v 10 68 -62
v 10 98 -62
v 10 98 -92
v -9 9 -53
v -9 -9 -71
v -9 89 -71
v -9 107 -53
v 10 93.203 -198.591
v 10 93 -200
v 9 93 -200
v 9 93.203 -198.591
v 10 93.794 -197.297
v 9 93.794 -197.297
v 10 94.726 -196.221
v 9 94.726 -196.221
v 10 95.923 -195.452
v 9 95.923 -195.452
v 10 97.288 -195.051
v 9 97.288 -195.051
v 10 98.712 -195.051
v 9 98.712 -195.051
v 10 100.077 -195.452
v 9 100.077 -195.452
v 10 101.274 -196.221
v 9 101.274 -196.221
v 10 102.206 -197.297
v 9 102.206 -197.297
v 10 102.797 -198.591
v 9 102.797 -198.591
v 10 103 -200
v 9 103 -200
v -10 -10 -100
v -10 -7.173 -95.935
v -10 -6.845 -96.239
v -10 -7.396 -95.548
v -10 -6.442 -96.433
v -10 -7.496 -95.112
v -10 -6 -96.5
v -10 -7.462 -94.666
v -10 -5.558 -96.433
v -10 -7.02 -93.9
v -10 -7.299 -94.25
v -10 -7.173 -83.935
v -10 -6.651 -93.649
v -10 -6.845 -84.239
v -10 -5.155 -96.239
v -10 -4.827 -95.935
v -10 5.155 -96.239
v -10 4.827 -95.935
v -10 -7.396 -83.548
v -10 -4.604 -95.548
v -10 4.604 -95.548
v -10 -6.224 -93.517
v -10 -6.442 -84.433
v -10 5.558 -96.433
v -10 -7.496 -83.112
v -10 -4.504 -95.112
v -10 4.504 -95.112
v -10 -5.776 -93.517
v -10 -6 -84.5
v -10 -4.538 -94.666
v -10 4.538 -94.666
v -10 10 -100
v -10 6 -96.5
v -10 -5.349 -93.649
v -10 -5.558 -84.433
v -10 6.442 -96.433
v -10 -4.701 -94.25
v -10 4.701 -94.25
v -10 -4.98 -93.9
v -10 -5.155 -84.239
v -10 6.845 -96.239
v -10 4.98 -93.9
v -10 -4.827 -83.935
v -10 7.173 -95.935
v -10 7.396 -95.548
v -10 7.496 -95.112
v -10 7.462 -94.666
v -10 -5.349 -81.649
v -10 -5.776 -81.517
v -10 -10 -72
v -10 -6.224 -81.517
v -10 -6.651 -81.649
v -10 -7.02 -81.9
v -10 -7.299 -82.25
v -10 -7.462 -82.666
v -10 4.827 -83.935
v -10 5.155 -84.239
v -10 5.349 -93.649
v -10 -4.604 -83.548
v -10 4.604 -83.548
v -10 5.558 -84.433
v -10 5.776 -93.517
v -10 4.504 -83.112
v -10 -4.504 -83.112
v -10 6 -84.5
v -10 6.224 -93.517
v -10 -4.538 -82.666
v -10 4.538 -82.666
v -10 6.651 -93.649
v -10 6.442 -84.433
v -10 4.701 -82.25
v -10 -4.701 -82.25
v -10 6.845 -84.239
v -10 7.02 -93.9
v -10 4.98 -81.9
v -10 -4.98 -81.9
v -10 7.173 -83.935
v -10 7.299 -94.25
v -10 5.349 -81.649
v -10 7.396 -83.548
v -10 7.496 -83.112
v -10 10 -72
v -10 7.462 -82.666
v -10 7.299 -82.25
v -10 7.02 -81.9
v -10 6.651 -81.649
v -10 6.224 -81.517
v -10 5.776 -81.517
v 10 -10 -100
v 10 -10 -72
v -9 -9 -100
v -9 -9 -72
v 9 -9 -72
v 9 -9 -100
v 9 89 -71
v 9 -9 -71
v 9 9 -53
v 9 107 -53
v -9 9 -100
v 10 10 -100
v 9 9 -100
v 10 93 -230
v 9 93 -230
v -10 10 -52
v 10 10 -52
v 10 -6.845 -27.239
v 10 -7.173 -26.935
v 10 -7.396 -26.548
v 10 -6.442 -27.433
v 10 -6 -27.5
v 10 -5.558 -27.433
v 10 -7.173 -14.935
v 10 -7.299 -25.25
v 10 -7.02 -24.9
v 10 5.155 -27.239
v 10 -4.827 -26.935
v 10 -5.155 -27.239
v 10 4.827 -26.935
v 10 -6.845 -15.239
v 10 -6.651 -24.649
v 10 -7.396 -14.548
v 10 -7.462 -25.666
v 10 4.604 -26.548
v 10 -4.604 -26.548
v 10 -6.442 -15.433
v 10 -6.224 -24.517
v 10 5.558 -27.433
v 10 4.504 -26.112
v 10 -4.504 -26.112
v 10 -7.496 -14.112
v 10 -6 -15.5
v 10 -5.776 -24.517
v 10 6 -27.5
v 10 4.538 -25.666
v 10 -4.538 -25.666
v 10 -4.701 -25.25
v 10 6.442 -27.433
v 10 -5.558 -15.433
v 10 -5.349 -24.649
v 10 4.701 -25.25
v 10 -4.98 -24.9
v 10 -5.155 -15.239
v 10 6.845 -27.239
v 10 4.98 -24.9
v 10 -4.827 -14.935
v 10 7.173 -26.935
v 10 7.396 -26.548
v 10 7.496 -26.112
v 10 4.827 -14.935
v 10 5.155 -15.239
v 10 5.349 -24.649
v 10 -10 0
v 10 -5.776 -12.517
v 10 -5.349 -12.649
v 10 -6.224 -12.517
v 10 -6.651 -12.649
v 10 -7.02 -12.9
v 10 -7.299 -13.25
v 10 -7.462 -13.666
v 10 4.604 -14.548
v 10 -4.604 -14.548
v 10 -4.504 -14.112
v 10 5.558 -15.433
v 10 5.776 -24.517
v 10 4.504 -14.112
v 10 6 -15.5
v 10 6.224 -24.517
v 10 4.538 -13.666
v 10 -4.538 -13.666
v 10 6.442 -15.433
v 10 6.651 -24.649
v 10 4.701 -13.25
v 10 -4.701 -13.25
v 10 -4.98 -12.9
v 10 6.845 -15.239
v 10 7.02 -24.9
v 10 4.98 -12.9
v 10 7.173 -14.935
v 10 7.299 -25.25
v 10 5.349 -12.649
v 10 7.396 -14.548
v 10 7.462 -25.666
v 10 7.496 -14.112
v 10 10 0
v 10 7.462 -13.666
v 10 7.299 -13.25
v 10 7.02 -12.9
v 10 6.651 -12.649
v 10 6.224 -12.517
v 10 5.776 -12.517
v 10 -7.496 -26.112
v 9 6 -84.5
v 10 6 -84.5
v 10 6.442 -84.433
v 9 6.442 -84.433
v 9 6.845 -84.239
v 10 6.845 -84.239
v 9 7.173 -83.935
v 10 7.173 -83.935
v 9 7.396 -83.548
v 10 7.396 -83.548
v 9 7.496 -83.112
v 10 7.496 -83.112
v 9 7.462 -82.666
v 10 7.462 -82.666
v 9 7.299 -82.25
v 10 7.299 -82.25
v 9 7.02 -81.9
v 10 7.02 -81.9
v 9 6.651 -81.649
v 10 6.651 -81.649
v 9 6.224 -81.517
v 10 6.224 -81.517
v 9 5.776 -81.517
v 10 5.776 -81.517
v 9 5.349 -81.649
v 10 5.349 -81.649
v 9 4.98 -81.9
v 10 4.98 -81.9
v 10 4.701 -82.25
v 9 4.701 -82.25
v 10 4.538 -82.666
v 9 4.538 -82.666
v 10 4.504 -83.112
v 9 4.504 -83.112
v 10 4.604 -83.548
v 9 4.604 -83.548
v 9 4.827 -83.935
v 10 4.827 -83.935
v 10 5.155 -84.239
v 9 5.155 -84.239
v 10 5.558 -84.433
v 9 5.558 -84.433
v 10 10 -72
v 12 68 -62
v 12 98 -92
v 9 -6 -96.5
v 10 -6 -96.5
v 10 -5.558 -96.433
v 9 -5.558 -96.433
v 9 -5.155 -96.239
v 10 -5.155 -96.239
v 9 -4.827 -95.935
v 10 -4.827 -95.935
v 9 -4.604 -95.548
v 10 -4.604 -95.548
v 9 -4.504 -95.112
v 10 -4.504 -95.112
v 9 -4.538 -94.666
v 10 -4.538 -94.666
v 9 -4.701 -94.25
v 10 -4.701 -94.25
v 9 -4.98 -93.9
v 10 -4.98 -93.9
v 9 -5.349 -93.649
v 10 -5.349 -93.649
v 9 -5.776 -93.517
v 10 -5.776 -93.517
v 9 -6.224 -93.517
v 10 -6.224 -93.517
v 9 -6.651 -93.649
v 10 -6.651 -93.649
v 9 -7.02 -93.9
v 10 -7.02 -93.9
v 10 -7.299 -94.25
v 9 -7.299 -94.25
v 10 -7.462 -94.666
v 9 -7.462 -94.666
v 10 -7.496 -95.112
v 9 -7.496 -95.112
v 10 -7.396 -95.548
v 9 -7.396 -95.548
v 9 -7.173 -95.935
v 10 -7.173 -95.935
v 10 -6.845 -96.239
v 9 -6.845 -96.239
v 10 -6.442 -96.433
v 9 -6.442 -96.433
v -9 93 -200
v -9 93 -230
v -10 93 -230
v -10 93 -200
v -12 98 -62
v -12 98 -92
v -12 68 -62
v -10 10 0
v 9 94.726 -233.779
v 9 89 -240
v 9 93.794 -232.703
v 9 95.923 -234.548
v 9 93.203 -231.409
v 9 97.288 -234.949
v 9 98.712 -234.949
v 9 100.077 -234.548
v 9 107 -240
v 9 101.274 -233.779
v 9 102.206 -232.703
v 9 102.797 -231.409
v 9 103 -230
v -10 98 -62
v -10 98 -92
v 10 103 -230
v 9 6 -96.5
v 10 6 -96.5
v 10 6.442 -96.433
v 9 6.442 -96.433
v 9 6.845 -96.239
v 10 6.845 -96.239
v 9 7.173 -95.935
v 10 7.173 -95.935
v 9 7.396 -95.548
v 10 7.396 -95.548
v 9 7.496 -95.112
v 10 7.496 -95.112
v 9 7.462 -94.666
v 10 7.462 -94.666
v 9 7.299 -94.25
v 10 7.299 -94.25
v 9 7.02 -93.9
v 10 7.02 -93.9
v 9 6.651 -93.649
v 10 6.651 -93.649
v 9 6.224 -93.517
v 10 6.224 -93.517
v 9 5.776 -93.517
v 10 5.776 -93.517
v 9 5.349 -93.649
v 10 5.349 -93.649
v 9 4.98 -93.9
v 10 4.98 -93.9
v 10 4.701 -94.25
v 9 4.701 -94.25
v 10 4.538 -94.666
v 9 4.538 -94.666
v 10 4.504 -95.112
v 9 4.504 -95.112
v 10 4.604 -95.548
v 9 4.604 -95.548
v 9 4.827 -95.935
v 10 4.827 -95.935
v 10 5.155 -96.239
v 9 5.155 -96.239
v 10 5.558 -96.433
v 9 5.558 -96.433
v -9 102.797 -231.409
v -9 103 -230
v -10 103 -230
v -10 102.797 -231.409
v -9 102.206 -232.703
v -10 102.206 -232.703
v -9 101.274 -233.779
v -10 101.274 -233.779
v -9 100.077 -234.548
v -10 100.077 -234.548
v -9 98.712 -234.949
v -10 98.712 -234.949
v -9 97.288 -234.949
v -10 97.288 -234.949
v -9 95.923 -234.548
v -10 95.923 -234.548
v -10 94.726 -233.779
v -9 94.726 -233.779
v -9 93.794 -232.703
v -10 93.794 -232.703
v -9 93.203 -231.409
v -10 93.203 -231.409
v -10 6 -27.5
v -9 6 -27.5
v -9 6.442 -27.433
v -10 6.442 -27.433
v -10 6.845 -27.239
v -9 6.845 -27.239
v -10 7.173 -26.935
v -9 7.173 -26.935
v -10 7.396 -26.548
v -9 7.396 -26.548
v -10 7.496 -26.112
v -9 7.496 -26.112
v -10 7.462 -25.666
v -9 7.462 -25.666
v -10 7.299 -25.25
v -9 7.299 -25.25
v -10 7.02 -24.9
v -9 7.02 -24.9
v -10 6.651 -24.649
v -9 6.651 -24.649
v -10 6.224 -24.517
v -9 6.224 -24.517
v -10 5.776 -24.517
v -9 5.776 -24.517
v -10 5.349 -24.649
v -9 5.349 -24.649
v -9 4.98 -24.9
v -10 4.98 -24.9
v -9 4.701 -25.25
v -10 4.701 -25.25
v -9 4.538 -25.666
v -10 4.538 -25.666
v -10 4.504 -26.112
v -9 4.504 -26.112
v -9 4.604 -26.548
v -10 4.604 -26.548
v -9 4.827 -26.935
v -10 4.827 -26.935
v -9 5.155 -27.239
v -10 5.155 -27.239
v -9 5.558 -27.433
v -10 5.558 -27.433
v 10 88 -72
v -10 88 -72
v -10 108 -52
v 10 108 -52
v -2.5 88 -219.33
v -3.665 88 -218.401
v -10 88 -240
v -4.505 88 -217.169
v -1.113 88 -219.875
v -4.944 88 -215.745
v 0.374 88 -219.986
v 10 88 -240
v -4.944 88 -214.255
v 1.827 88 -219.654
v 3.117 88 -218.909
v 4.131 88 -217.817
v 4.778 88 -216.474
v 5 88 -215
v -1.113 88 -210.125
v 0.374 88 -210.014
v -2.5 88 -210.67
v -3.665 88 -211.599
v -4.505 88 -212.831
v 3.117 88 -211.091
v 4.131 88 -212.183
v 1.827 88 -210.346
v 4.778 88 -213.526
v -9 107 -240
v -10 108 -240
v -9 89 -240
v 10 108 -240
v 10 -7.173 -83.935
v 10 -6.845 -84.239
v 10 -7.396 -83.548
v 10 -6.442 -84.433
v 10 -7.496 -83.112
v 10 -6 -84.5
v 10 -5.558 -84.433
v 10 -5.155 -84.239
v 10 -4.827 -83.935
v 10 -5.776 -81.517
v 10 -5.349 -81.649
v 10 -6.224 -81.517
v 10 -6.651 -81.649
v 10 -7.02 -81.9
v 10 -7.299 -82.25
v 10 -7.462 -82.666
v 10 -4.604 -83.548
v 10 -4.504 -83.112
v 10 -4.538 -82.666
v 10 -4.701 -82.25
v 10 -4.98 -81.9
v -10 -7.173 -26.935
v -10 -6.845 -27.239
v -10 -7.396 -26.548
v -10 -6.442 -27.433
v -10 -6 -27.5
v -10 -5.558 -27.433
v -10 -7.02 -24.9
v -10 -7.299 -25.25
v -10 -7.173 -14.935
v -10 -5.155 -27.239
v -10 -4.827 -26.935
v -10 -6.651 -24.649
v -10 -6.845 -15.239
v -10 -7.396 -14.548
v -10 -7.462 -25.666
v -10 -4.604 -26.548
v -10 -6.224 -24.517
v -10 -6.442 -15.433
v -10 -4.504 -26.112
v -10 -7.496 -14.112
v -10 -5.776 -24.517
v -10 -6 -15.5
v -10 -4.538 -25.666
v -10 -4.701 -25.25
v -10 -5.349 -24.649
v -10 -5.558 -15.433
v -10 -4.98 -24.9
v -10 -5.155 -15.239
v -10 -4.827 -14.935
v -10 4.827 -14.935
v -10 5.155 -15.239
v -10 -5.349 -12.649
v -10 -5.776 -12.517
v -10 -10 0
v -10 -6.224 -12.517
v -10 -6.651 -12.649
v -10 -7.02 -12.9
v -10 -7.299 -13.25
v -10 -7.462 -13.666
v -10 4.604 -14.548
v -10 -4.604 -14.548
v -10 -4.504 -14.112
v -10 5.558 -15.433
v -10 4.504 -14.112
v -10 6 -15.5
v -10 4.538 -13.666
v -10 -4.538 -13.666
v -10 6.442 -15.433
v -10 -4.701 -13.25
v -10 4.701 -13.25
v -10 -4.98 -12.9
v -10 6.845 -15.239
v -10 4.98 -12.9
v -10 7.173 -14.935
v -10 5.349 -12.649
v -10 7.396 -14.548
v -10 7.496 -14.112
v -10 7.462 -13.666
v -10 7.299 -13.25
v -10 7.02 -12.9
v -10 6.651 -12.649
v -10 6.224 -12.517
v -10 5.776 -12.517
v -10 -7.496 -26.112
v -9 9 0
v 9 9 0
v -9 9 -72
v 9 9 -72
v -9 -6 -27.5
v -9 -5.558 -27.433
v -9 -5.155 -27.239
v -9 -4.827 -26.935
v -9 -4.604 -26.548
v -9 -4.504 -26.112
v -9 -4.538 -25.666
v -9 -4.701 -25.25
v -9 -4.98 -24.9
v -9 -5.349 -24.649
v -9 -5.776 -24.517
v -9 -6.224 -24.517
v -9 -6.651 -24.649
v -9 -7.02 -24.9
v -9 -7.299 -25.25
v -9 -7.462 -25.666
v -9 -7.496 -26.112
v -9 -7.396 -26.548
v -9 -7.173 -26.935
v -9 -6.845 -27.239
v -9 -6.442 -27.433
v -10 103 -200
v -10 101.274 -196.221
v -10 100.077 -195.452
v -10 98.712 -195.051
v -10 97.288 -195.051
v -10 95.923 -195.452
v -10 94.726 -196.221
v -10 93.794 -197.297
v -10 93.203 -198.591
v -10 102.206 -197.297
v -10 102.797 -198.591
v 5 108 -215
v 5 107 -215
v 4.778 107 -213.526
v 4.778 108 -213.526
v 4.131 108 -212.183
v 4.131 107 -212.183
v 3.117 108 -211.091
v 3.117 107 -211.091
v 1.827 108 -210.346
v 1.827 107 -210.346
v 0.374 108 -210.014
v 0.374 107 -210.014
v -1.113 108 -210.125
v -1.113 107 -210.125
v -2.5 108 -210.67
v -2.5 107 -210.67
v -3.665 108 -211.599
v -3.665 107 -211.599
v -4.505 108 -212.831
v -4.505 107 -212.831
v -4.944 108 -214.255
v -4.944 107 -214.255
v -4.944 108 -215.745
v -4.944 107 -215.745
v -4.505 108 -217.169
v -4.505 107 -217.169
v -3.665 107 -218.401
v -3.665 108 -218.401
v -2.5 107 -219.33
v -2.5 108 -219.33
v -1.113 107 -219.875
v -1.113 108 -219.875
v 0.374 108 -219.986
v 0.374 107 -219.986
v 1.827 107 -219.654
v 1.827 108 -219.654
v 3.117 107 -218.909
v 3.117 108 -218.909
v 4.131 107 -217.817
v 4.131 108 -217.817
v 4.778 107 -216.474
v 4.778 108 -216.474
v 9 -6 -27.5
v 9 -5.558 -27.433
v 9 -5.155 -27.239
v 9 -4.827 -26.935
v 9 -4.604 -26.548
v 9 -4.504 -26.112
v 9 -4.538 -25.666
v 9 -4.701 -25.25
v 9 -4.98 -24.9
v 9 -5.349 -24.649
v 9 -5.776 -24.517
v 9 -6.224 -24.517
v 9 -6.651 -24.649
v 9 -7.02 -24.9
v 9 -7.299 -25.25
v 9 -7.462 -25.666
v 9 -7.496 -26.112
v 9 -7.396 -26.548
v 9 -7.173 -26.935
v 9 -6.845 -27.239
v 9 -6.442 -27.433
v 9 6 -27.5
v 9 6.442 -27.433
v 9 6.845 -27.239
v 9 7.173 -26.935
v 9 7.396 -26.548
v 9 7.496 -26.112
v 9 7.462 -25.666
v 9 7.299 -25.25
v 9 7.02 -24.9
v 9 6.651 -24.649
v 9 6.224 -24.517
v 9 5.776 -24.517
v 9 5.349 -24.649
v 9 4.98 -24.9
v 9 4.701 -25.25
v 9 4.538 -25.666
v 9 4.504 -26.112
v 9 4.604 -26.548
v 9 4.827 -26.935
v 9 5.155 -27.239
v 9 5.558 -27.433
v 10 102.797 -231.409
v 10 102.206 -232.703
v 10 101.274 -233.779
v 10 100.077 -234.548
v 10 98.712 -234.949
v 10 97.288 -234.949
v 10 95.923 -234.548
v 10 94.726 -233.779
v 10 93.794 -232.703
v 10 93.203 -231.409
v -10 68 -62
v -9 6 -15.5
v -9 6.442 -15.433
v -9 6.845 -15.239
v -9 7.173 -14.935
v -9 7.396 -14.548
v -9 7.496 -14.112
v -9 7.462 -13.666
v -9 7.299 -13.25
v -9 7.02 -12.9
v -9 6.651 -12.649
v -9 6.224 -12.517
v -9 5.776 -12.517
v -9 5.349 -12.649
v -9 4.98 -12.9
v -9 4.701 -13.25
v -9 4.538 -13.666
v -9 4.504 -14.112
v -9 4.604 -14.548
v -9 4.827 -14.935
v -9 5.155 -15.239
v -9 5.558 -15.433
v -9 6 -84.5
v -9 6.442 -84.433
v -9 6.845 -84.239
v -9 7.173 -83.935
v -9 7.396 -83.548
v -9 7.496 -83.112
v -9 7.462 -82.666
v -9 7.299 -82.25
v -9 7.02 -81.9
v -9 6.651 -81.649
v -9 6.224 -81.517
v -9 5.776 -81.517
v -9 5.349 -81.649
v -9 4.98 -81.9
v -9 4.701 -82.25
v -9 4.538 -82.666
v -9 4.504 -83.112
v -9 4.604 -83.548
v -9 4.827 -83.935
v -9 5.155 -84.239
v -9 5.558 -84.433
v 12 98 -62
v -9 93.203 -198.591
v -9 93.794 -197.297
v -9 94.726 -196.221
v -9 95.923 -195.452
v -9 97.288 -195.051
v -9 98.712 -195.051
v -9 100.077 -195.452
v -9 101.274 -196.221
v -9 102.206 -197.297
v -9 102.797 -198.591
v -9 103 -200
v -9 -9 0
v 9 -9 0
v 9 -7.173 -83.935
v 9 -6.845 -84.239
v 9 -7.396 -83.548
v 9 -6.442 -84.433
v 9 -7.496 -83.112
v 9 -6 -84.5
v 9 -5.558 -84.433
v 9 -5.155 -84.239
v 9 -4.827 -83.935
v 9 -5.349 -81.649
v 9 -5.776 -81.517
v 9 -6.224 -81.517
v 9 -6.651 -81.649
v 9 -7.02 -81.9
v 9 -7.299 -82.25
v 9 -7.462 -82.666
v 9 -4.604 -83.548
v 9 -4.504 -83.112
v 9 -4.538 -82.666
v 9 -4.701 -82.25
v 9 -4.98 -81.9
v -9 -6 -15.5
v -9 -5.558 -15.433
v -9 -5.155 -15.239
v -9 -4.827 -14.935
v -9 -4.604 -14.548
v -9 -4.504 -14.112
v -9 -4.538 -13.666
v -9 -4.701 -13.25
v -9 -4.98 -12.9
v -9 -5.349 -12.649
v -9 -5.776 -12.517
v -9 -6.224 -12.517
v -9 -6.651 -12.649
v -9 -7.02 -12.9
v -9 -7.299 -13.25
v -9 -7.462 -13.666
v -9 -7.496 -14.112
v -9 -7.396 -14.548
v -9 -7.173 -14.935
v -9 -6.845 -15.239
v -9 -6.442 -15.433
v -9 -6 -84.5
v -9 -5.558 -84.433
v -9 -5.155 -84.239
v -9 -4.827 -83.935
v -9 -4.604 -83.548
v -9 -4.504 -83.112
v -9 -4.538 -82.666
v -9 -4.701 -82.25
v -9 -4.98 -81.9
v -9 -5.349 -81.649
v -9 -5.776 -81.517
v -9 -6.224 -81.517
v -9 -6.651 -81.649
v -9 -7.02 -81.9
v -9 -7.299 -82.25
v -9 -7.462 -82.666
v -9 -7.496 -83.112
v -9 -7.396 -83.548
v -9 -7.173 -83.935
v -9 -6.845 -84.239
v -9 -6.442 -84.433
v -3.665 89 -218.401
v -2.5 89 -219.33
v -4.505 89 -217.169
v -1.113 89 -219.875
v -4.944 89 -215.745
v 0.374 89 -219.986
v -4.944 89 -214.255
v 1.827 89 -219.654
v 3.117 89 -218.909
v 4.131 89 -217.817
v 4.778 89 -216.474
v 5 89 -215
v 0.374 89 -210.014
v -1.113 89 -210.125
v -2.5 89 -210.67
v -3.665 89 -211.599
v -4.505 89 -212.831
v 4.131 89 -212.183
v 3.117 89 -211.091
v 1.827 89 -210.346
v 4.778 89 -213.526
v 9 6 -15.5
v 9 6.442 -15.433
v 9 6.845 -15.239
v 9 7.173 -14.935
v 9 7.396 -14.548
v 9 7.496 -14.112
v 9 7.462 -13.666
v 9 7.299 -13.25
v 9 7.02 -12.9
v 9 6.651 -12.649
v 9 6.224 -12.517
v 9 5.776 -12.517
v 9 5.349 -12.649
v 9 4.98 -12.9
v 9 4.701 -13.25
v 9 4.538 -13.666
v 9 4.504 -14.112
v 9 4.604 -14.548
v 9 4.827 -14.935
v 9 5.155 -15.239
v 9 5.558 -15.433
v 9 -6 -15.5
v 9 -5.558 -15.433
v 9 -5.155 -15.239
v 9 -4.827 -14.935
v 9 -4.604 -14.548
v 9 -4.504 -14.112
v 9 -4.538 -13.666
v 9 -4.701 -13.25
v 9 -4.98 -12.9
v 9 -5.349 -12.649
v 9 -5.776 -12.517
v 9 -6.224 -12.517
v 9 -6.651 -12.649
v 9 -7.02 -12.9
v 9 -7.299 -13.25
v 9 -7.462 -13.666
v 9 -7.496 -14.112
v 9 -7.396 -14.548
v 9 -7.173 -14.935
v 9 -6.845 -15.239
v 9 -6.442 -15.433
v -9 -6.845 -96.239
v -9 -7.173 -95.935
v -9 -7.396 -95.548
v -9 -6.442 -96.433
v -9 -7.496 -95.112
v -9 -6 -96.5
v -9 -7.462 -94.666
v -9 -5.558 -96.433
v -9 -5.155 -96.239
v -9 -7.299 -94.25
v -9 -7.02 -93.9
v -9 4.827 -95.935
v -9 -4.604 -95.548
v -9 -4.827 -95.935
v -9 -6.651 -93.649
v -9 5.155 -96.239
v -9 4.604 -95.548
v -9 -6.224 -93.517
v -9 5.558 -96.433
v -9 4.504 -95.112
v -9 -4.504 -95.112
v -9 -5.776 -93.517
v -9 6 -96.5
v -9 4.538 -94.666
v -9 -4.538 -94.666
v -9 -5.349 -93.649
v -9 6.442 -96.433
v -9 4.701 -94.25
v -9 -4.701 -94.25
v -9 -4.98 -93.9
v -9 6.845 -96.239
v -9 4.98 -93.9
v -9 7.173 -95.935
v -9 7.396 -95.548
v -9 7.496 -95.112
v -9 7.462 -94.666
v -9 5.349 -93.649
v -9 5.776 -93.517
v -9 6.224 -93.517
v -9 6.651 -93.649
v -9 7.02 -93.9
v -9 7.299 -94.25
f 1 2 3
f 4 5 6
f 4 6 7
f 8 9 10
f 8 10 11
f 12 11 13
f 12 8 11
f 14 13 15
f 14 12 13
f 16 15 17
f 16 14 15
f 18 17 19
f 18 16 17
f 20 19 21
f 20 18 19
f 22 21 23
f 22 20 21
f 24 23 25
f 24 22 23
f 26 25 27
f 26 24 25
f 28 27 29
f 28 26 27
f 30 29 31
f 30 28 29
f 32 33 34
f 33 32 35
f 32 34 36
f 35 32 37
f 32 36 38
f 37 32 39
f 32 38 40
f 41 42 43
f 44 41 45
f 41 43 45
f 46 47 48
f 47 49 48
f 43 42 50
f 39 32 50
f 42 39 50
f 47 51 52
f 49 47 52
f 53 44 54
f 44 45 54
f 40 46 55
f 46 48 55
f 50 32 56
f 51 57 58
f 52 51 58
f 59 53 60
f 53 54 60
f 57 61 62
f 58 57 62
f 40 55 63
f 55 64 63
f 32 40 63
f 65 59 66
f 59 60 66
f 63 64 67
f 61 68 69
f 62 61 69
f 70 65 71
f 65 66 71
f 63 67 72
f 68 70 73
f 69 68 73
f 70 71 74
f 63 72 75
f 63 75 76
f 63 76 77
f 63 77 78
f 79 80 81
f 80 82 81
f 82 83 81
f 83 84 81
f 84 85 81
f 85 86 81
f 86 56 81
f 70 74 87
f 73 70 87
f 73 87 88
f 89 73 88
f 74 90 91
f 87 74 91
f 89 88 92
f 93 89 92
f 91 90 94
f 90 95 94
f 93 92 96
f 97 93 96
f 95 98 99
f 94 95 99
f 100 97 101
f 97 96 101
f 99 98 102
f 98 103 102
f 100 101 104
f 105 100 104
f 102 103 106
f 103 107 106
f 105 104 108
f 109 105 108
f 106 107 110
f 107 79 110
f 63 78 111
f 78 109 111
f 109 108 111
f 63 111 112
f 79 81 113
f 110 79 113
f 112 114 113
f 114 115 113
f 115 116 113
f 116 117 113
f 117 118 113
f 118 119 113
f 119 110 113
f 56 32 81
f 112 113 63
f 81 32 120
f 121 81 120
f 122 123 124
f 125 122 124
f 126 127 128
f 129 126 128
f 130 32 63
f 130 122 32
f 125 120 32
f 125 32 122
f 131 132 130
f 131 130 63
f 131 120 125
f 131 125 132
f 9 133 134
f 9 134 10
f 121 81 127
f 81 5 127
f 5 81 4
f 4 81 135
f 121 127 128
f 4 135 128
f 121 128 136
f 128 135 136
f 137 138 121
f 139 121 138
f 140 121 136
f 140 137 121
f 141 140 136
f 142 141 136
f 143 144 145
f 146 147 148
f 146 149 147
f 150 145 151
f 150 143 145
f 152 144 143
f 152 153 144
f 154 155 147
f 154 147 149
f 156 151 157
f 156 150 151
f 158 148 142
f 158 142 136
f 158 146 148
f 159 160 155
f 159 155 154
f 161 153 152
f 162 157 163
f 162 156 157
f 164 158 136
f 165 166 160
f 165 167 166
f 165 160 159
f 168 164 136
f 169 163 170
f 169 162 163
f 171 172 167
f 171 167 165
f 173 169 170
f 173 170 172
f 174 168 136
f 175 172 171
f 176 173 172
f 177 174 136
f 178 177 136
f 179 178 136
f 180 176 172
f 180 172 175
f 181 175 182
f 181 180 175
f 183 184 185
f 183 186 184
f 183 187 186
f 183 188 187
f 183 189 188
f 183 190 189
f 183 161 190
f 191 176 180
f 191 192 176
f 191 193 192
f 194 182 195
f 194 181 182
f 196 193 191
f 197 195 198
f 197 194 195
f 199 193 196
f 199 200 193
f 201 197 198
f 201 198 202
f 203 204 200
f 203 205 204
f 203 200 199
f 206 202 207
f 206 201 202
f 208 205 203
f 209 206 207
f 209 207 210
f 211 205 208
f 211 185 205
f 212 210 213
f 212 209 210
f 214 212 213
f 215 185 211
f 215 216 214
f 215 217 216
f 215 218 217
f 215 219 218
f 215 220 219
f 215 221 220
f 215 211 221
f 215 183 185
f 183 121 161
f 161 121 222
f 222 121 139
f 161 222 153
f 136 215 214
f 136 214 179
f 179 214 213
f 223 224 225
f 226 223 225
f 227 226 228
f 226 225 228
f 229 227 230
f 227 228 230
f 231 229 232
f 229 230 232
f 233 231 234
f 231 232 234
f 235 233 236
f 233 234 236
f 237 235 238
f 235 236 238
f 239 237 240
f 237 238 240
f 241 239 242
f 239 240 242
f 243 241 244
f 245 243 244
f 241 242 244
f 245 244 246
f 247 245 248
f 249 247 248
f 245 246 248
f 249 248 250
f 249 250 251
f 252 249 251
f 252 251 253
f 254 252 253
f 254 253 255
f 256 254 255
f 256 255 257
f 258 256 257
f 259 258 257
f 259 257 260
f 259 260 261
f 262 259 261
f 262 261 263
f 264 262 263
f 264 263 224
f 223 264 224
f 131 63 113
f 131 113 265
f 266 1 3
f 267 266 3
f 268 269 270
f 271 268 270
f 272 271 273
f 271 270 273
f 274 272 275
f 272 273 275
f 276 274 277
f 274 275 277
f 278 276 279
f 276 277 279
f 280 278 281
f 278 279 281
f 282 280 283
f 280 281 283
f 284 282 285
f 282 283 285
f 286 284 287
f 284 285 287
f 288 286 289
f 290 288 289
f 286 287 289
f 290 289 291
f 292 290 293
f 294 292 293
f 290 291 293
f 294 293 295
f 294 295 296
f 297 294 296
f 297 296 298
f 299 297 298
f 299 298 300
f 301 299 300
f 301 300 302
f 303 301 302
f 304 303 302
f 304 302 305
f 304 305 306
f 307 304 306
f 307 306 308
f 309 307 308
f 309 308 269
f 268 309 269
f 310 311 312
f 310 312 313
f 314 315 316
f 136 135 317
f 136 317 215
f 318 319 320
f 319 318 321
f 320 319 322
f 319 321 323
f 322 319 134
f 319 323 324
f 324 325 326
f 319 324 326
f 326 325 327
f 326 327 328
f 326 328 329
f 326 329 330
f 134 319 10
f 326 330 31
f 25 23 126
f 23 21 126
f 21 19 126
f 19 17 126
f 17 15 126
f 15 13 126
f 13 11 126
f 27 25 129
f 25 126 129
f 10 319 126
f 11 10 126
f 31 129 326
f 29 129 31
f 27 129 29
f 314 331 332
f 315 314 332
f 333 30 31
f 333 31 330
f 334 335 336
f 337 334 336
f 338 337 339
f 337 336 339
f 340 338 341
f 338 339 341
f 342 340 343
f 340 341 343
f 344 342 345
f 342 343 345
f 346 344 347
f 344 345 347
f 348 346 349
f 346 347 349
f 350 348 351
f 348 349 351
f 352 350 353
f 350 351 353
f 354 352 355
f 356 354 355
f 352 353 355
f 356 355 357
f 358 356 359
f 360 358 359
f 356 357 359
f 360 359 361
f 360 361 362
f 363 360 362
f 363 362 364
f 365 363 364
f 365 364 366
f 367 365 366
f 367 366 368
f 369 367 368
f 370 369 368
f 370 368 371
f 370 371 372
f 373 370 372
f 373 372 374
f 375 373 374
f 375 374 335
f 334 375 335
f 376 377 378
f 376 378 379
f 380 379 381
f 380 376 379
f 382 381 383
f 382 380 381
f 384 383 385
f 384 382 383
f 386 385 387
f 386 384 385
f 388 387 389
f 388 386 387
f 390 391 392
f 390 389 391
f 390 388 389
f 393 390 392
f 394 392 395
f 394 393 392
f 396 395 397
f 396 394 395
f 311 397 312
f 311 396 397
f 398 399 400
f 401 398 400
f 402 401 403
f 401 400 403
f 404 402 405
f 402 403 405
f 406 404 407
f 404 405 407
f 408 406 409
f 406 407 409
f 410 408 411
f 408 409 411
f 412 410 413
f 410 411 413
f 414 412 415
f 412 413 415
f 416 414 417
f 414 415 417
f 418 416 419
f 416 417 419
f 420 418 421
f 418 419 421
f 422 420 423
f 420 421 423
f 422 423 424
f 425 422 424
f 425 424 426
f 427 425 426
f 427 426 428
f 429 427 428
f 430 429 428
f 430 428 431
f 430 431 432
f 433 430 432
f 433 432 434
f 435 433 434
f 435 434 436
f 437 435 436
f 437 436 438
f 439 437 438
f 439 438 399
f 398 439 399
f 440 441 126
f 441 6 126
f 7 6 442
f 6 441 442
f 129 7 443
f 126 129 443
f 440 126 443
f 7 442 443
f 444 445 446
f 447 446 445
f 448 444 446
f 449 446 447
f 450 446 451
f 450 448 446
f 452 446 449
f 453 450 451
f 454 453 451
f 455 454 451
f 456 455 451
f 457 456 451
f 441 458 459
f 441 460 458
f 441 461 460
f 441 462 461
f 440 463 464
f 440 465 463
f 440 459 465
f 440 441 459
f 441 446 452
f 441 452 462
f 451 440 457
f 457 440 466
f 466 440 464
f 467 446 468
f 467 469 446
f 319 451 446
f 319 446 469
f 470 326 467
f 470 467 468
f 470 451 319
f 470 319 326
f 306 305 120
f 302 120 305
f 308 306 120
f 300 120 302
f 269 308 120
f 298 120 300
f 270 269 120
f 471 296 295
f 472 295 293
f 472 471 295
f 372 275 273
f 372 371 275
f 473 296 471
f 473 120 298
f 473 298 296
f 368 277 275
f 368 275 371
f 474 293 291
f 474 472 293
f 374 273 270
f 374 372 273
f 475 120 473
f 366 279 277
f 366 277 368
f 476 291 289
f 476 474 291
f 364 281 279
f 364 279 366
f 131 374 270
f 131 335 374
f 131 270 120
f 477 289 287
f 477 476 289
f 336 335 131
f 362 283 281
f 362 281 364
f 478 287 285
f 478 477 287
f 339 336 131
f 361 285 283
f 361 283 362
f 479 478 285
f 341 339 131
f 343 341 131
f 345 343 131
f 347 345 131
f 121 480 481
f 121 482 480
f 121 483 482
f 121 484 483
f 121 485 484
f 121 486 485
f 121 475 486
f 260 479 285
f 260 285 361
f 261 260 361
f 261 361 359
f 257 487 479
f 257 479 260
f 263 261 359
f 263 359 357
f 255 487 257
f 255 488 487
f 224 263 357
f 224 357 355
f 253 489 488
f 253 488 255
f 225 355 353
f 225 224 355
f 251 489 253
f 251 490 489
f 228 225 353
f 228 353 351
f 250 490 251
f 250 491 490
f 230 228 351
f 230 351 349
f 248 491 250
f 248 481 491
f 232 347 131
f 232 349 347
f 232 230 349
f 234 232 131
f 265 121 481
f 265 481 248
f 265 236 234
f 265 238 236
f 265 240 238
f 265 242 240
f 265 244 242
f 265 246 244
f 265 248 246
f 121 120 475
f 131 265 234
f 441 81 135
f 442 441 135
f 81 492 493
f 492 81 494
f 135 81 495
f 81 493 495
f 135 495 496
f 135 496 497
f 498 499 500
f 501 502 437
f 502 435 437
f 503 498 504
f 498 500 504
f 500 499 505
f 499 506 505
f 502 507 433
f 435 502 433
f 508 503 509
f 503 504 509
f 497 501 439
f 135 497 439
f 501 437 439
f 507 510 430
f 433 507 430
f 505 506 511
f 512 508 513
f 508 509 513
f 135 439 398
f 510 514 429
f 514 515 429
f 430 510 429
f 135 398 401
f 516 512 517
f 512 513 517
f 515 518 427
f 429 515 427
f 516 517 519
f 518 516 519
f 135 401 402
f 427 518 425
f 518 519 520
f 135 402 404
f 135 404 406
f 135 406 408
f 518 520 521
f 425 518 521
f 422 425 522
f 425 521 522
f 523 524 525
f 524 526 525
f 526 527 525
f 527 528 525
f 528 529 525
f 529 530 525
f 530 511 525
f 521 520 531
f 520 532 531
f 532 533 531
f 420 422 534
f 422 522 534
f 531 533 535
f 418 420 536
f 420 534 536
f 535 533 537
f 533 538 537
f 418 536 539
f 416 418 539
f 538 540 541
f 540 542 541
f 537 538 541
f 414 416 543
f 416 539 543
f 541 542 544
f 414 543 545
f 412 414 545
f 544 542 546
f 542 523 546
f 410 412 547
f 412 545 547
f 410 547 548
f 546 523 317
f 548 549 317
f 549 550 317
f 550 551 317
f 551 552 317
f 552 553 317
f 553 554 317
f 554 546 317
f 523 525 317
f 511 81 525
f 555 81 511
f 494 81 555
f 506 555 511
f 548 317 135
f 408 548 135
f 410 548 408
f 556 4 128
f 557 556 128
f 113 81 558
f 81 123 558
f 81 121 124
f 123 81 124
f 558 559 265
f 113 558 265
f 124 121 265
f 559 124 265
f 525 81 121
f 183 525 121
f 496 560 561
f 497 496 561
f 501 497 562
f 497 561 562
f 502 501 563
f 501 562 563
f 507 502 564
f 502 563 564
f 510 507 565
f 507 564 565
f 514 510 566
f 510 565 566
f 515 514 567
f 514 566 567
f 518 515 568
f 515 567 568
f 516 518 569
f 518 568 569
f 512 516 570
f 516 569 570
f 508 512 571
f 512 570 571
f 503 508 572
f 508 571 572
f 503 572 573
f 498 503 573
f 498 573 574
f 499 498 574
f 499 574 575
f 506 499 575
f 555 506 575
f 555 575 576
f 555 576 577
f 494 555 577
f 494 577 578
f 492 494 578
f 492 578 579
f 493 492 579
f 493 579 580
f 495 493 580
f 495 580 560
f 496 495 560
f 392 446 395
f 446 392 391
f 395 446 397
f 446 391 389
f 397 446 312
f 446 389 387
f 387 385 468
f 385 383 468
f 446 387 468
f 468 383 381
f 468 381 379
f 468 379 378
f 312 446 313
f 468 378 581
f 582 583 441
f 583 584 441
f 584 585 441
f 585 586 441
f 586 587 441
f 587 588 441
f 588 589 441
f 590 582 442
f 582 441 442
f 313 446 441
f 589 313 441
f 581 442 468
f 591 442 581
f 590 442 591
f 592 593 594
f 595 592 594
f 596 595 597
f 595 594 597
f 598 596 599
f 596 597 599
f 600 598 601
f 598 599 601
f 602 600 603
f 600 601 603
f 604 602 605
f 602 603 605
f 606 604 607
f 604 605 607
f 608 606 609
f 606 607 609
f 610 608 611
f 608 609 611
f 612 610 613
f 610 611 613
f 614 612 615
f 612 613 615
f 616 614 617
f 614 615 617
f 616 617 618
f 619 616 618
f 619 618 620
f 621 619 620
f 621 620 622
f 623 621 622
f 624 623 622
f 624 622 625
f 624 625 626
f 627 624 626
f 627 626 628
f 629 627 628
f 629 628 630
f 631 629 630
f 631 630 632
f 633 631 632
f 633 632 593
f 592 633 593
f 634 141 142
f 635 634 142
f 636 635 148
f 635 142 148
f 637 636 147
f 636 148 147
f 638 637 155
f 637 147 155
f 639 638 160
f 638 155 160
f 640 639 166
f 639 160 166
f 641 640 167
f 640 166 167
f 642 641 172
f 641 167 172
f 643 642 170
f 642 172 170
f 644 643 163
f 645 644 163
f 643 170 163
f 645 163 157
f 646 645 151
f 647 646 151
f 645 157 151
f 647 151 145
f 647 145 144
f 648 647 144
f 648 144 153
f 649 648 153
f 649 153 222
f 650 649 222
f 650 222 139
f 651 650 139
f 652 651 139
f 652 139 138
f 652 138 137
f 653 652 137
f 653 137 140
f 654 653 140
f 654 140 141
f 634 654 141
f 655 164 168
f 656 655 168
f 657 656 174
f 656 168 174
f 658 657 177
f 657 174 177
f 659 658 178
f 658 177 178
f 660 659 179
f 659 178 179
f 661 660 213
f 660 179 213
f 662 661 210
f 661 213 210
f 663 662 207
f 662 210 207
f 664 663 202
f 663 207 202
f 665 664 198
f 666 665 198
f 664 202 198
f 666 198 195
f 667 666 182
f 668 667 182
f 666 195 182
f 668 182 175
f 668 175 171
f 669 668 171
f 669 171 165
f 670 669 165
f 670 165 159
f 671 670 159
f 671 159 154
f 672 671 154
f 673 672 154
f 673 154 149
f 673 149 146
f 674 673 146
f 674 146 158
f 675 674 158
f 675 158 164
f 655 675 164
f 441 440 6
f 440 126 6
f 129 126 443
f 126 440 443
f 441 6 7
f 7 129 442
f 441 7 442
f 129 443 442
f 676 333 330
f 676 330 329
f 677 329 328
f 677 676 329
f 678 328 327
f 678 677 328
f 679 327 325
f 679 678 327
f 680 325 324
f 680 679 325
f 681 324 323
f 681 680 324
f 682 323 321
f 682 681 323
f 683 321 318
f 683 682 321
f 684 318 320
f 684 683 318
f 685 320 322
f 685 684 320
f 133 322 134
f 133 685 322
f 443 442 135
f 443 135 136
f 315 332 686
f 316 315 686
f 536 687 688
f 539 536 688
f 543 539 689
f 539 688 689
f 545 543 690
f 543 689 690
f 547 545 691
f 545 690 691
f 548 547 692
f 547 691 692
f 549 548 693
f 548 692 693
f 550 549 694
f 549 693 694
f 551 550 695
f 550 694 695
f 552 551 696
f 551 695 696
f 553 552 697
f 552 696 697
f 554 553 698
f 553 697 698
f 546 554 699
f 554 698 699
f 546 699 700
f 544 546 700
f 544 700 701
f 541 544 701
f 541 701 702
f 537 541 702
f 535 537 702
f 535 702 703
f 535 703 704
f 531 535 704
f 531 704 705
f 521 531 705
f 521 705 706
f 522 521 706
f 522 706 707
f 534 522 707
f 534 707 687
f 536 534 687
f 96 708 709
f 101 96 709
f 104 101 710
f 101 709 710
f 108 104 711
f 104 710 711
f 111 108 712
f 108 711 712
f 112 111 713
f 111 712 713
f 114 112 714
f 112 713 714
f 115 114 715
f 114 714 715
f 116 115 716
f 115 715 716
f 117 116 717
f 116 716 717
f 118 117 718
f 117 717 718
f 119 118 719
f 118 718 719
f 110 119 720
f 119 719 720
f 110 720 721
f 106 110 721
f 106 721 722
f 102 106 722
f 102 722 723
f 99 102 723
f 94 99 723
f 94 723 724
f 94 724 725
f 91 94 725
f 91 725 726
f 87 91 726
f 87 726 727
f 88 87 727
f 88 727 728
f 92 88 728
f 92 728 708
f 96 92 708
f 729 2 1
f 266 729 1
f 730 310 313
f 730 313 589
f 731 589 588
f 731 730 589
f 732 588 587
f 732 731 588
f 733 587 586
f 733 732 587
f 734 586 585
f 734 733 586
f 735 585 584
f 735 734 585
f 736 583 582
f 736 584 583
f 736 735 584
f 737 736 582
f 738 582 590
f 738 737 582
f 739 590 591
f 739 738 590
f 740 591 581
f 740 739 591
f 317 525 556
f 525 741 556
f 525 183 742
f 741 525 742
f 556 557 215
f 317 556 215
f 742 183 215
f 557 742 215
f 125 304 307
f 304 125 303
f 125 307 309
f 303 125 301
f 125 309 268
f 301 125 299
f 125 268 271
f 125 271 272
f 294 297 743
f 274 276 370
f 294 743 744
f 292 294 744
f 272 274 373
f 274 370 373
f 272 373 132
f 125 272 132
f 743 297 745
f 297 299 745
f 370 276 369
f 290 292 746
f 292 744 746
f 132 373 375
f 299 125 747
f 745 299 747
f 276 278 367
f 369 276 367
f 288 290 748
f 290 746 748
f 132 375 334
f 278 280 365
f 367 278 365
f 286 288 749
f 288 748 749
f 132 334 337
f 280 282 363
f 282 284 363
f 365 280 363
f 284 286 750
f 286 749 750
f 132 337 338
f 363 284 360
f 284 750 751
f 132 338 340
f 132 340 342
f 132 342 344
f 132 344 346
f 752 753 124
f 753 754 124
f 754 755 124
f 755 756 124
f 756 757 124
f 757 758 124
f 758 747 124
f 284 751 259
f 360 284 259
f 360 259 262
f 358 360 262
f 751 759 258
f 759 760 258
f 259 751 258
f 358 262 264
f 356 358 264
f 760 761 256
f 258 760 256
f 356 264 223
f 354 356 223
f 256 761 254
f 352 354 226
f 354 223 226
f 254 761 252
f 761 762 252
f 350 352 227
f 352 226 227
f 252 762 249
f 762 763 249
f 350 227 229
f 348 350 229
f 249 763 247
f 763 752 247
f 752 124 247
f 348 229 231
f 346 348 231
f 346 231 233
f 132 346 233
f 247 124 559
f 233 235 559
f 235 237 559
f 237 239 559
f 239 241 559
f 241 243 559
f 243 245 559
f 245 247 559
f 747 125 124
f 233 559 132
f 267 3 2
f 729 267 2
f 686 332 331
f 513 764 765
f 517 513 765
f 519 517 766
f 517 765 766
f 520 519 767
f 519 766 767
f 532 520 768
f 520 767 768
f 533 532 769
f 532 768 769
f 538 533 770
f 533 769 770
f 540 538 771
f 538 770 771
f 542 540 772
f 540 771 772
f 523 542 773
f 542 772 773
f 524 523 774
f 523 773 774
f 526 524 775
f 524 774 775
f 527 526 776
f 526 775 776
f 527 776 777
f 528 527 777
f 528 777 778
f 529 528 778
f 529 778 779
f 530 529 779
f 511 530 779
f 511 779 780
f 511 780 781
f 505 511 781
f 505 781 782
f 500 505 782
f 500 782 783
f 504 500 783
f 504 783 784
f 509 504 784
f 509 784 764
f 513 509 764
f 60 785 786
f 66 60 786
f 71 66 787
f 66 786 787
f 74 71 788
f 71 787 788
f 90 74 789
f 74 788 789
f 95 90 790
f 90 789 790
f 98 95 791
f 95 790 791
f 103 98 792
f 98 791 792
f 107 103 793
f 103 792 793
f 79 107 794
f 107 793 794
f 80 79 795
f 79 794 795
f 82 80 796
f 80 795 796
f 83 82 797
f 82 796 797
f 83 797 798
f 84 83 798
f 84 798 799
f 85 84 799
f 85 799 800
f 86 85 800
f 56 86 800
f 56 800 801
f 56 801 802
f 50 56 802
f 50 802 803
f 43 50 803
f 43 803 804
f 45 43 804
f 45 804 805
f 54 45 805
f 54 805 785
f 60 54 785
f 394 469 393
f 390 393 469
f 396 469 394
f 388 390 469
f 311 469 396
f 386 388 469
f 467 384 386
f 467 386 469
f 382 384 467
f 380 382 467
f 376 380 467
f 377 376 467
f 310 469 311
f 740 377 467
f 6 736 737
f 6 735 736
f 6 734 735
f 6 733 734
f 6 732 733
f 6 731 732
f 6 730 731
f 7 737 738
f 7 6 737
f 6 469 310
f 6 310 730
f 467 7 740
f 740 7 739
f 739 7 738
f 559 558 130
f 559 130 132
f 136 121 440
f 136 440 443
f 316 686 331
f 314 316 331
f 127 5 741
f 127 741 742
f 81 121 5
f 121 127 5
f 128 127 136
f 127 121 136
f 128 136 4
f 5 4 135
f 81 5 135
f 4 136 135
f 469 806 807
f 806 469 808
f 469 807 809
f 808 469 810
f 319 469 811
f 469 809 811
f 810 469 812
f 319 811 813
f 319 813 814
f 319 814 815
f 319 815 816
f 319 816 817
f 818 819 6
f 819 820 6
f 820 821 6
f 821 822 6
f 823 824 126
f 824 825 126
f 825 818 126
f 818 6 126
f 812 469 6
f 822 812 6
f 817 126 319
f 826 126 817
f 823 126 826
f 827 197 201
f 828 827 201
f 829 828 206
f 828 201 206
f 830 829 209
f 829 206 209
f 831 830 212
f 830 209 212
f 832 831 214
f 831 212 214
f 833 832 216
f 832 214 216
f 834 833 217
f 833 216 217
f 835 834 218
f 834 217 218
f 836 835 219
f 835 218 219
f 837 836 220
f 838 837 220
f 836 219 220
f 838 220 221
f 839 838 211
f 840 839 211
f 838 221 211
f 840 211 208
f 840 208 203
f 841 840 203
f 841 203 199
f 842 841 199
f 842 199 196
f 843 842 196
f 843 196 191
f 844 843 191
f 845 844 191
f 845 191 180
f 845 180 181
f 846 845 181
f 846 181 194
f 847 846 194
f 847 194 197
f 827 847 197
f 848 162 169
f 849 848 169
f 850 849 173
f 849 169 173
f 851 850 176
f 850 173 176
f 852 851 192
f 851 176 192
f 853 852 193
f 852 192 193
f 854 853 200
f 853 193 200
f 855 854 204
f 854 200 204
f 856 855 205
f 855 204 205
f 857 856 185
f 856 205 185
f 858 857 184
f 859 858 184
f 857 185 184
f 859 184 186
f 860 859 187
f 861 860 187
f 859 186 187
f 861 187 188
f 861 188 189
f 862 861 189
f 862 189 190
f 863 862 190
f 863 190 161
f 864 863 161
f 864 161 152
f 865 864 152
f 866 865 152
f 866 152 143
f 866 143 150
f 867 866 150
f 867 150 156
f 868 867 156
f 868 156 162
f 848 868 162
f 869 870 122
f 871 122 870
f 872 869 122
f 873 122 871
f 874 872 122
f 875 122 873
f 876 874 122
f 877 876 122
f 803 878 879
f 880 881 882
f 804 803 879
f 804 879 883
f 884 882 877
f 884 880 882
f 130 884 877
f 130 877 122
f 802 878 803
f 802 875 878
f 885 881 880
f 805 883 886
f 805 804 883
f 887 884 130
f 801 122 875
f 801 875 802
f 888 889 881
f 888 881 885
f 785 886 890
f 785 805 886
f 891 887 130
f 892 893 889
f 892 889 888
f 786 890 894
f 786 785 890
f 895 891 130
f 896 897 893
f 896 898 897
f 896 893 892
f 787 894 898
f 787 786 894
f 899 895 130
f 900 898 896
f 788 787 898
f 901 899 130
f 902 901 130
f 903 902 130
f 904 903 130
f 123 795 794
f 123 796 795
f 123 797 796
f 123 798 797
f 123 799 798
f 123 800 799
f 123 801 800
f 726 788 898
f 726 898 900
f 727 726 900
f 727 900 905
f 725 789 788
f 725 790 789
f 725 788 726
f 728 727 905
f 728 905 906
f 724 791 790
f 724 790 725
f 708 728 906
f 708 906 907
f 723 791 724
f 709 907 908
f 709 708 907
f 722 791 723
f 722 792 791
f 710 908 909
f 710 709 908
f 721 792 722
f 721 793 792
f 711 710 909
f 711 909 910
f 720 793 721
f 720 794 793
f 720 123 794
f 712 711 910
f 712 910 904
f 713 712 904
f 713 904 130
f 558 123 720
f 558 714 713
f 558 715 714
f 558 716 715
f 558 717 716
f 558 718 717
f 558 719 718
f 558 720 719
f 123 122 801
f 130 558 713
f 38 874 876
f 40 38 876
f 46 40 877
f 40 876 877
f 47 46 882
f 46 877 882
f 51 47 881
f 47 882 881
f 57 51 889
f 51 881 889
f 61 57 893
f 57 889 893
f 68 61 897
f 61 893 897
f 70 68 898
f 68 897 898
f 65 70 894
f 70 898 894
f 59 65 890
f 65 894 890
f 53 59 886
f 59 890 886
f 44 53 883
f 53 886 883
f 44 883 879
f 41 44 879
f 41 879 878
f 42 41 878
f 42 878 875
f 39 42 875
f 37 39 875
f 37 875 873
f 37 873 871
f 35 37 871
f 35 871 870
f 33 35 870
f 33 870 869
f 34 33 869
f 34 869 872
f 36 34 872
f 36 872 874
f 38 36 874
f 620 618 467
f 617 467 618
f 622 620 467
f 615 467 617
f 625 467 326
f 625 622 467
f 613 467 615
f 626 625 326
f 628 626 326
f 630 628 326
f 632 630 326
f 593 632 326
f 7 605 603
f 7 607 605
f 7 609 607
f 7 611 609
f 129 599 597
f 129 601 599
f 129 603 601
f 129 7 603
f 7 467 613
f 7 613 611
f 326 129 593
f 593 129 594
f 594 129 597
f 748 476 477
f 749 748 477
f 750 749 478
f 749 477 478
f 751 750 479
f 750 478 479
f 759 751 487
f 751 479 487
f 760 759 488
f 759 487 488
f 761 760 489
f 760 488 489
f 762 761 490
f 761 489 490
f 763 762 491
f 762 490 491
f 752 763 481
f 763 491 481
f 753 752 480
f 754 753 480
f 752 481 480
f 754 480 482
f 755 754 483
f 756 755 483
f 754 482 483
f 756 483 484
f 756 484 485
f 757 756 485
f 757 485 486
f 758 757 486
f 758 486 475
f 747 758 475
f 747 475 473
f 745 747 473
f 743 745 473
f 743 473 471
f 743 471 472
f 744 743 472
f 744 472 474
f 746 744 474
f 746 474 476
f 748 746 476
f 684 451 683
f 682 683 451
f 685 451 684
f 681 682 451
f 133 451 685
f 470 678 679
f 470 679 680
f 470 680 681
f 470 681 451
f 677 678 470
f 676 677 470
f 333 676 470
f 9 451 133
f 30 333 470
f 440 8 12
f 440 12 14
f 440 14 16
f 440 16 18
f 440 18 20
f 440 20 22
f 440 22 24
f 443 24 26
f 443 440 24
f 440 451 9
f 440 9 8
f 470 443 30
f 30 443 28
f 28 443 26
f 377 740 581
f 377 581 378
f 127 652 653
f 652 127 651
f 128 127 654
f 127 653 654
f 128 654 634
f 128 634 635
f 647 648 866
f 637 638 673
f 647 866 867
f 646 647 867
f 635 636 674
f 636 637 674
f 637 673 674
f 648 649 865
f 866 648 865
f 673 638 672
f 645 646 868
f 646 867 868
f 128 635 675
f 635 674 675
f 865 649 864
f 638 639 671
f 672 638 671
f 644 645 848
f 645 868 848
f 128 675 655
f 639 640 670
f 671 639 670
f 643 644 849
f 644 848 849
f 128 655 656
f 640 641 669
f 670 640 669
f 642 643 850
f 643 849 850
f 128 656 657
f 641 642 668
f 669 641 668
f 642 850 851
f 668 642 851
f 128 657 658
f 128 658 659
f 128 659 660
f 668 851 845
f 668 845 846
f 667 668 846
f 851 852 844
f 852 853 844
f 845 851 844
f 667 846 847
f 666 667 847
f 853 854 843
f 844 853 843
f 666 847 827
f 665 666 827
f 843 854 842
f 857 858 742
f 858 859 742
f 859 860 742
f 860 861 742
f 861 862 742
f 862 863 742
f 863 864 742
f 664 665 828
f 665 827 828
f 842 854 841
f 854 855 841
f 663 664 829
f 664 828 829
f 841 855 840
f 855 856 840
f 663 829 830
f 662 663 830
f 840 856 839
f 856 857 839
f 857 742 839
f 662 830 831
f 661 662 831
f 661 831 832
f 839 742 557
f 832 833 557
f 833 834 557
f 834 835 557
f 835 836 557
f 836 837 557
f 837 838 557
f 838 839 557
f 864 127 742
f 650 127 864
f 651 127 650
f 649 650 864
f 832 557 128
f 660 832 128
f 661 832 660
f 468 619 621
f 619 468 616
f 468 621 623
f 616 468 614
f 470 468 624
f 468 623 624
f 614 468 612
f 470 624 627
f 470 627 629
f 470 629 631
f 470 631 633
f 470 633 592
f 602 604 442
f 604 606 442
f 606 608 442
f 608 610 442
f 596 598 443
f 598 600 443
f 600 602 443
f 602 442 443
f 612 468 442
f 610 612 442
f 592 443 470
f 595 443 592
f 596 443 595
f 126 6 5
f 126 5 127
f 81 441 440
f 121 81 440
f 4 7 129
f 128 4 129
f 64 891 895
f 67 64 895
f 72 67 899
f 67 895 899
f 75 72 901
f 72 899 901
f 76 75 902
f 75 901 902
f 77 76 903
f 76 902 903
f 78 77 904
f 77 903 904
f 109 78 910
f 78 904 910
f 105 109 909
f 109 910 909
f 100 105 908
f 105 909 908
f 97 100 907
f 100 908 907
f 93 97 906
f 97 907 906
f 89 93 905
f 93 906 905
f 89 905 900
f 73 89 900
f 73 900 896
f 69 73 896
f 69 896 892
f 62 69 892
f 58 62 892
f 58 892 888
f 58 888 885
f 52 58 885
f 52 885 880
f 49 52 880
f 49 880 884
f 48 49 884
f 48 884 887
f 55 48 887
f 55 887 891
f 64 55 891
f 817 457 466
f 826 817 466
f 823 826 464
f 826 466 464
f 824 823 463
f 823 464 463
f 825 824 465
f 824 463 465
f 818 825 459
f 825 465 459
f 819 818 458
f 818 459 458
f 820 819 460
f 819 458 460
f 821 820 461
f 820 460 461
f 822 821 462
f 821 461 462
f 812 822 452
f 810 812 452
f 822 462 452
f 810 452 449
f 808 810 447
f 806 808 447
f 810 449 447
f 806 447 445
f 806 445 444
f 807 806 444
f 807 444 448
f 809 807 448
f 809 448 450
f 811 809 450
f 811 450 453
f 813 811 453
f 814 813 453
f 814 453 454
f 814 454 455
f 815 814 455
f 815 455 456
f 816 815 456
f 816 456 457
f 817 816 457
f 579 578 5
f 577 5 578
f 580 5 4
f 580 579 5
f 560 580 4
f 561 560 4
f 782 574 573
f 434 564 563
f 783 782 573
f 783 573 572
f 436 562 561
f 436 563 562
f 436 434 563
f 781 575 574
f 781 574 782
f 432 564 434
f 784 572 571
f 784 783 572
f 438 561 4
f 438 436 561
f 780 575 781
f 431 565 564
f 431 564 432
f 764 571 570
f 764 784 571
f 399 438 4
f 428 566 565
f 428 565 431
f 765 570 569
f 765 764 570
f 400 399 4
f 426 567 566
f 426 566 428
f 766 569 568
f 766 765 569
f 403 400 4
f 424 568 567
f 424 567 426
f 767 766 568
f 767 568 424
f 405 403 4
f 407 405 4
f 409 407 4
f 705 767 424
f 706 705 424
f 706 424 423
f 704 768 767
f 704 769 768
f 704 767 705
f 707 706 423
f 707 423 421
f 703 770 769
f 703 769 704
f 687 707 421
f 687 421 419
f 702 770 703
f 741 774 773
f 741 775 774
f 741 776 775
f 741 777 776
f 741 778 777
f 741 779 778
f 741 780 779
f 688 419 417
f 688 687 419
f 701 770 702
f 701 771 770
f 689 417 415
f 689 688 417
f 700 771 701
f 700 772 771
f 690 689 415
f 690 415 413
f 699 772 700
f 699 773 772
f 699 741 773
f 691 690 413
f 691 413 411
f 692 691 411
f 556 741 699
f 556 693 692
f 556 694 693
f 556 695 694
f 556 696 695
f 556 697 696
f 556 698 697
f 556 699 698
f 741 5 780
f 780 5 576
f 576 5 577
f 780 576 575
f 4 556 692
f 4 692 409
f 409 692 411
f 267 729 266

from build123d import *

# Parameters (mm, degrees)
SKETCH_14_W                = 20
SKETCH_14_H                = 20
SKETCH_14_W_2              = 18
SKETCH_14_H_2              = 18
F_20X20X1_1_DEPTH          = 77.142135624
SKETCH_14_ON_SEGMENT_2_W   = 20
SKETCH_14_ON_SEGMENT_2_H   = 20
SKETCH_14_ON_SEGMENT_2_W_2 = 18
SKETCH_14_ON_SEGMENT_2_H_2 = 18
F_20X20X1_1_2_DEPTH        = 128.284271247
SKETCH_14_ON_SEGMENT_3_W   = 20
SKETCH_14_ON_SEGMENT_3_H   = 20
SKETCH_14_ON_SEGMENT_3_W_2 = 18
SKETCH_14_ON_SEGMENT_3_H_2 = 18
F_20X20X1_1_3_DEPTH        = 193.142135624
SKETCH_14_ON_SEGMENT_4_W   = 20
SKETCH_14_ON_SEGMENT_4_H   = 20
SKETCH_14_ON_SEGMENT_4_W_2 = 18
SKETCH_14_ON_SEGMENT_4_H_2 = 18
F_20X20X1_1_4_DEPTH        = 64
SKETCH_12_R                = 1.5
CUT_EXTRUDE_1_DEPTH        = 264.939386981
CUT_EXTRUDE_3_DEPTH        = 264.939386981
CUT_EXTRUDE_4_DEPTH        = 260.43014474
EXTRUDE_1_DEPTH            = 2
EXTRUDE_2_DEPTH            = 2
SKETCH_17_R                = 1.5
CUT_EXTRUDE_7_DEPTH        = 265.098466486
SKETCH_23_W                = 25
SKETCH_23_H                = 20
CUT_EXTRUDE_8_DEPTH        = 265.098466486


with BuildPart() as part:
    # 草图14 → 铝管 20X20X1(1) (new body)
    with BuildSketch(Plane.YX):
        Rectangle(SKETCH_14_W, SKETCH_14_H)
        Rectangle(SKETCH_14_W_2, SKETCH_14_H_2, mode=Mode.SUBTRACT)
    extrude(amount=F_20X20X1_1_DEPTH)

    # 铝管 20X20X1(1) mitre 1
    split(bisect_by=Plane(origin=(0, 0, -62), x_dir=(1, 0, 0), z_dir=(0, -0.707106781, 0.707106781)), keep=Keep.TOP)

    # 草图12 → 切除-拉伸1 (cut, through all)
    with BuildSketch(Plane(origin=(10, 0, 0), x_dir=(0, 0, -1), z_dir=(1, 0, 0))):
        with Locations((14, 6)):
            Circle(SKETCH_12_R)
        with Locations((14, -6)):
            Circle(SKETCH_12_R)
        with Locations((26, -6)):
            Circle(SKETCH_12_R)
        with Locations((26, 6)):
            Circle(SKETCH_12_R)
    extrude(amount=-CUT_EXTRUDE_1_DEPTH, mode=Mode.SUBTRACT)


with BuildPart() as body_2:
    # 草图14 on segment 2 (carried to segment 2) → 20X20X1_1 2 (new body)
    with BuildSketch(Plane(origin=(0, -15.142135624, -62), x_dir=(0, 0, 1), z_dir=(0, 1, 0))):
        Rectangle(SKETCH_14_ON_SEGMENT_2_W, SKETCH_14_ON_SEGMENT_2_H)
        Rectangle(SKETCH_14_ON_SEGMENT_2_W_2, SKETCH_14_ON_SEGMENT_2_H_2, mode=Mode.SUBTRACT)
    extrude(amount=F_20X20X1_1_2_DEPTH)

    # 20X20X1_1 2 mitre 1
    split(bisect_by=Plane(origin=(0, 0, -62), x_dir=(-1, 0, 0), z_dir=(0, 0.707106781, -0.707106781)), keep=Keep.TOP)

    # 20X20X1_1 2 mitre 2
    split(bisect_by=Plane(origin=(0, 98, -62), x_dir=(1, 0, 0), z_dir=(0, -0.707106781, 0.707106781)), keep=Keep.TOP)


with BuildPart() as body_3:
    # 草图14 on segment 3 (carried to segment 3) → 20X20X1_1 3 (new body)
    with BuildSketch(Plane(origin=(0, 98, -46.857864376), x_dir=(0, 1, 0), z_dir=(0, 0, -1))):
        Rectangle(SKETCH_14_ON_SEGMENT_3_W, SKETCH_14_ON_SEGMENT_3_H)
        Rectangle(SKETCH_14_ON_SEGMENT_3_W_2, SKETCH_14_ON_SEGMENT_3_H_2, mode=Mode.SUBTRACT)
    extrude(amount=F_20X20X1_1_3_DEPTH)

    # 20X20X1_1 3 mitre 1
    split(bisect_by=Plane(origin=(0, 98, -62), x_dir=(-1, 0, 0), z_dir=(0, 0.707106781, -0.707106781)), keep=Keep.TOP)

    # 草图15 → 切除-拉伸3 (cut, through all)
    with BuildSketch(Plane(origin=(10, 0, 0), x_dir=(0, 0, -1), z_dir=(1, 0, 0))):
        with BuildLine():
            Line((200, 103), (230, 103))
            ThreePointArc((230, 103), (235, 98), (230, 93))
            Line((230, 93), (200, 93))
            ThreePointArc((200, 93), (195, 98), (200, 103))
        make_face()
    extrude(amount=-CUT_EXTRUDE_3_DEPTH, mode=Mode.SUBTRACT)

    # 草图16 → 切除-拉伸4 (cut, through all)
    with BuildSketch(Plane.XZ.offset(-88)):
        with BuildLine():
            ThreePointArc((-5, -215), (0, -220), (5, -215))
            Line((5, -215), (-5, -215))
        make_face()
        with BuildLine():
            Line((-5, -215), (5, -215))
            ThreePointArc((5, -215), (0, -210), (-5, -215))
        make_face()
    extrude(amount=-CUT_EXTRUDE_4_DEPTH, mode=Mode.SUBTRACT)


with BuildPart() as body_4:
    # 草图14 on segment 4 (carried to segment 4) → 20X20X1_1 4 (new body)
    with BuildSketch(Plane.YX.offset(61)):
        Rectangle(SKETCH_14_ON_SEGMENT_4_W, SKETCH_14_ON_SEGMENT_4_H)
        Rectangle(SKETCH_14_ON_SEGMENT_4_W_2, SKETCH_14_ON_SEGMENT_4_H_2, mode=Mode.SUBTRACT)
    extrude(amount=F_20X20X1_1_4_DEPTH)

    # 20X20X1_1 4 mitre 1
    split(bisect_by=Plane.YX.offset(72), keep=Keep.TOP)

    # 草图17 → 切除-拉伸7 (cut, through all)
    with BuildSketch(Plane(origin=(10, 0, 0), x_dir=(0, 0, -1), z_dir=(1, 0, 0))):
        with Locations((83, 6)):
            Circle(SKETCH_17_R)
        with Locations((95, 6)):
            Circle(SKETCH_17_R)
        with Locations((83, -6)):
            Circle(SKETCH_17_R)
        with Locations((95, -6)):
            Circle(SKETCH_17_R)
    extrude(amount=-CUT_EXTRUDE_7_DEPTH, mode=Mode.SUBTRACT)

    # 草图23 → 切除-拉伸8 (cut, through all)
    with BuildSketch(Plane(origin=(10, 0, 0), x_dir=(0, 0, -1), z_dir=(1, 0, 0))):
        with Locations((112.5, 0)):
            Rectangle(SKETCH_23_W, SKETCH_23_H)
    extrude(amount=-CUT_EXTRUDE_8_DEPTH, mode=Mode.SUBTRACT)


with BuildPart() as body_5:
    # 草图21 → 凸台-拉伸1 (new body)
    with BuildSketch(Plane(origin=(10, 0, 0), x_dir=(0, 0, -1), z_dir=(1, 0, 0))):
        Polygon((62, 98), (62, 68), (92, 98), align=None)
    extrude(amount=EXTRUDE_1_DEPTH)


with BuildPart() as body_6:
    # 草图22 → 凸台-拉伸2 (new body)
    with BuildSketch(Plane.ZY.offset(10)):
        Polygon((-62, 98), (-92, 98), (-62, 68), align=None)
    extrude(amount=EXTRUDE_2_DEPTH)


solid = Compound([part.part, body_2.part, body_3.part, body_4.part, body_5.part, body_6.part])
